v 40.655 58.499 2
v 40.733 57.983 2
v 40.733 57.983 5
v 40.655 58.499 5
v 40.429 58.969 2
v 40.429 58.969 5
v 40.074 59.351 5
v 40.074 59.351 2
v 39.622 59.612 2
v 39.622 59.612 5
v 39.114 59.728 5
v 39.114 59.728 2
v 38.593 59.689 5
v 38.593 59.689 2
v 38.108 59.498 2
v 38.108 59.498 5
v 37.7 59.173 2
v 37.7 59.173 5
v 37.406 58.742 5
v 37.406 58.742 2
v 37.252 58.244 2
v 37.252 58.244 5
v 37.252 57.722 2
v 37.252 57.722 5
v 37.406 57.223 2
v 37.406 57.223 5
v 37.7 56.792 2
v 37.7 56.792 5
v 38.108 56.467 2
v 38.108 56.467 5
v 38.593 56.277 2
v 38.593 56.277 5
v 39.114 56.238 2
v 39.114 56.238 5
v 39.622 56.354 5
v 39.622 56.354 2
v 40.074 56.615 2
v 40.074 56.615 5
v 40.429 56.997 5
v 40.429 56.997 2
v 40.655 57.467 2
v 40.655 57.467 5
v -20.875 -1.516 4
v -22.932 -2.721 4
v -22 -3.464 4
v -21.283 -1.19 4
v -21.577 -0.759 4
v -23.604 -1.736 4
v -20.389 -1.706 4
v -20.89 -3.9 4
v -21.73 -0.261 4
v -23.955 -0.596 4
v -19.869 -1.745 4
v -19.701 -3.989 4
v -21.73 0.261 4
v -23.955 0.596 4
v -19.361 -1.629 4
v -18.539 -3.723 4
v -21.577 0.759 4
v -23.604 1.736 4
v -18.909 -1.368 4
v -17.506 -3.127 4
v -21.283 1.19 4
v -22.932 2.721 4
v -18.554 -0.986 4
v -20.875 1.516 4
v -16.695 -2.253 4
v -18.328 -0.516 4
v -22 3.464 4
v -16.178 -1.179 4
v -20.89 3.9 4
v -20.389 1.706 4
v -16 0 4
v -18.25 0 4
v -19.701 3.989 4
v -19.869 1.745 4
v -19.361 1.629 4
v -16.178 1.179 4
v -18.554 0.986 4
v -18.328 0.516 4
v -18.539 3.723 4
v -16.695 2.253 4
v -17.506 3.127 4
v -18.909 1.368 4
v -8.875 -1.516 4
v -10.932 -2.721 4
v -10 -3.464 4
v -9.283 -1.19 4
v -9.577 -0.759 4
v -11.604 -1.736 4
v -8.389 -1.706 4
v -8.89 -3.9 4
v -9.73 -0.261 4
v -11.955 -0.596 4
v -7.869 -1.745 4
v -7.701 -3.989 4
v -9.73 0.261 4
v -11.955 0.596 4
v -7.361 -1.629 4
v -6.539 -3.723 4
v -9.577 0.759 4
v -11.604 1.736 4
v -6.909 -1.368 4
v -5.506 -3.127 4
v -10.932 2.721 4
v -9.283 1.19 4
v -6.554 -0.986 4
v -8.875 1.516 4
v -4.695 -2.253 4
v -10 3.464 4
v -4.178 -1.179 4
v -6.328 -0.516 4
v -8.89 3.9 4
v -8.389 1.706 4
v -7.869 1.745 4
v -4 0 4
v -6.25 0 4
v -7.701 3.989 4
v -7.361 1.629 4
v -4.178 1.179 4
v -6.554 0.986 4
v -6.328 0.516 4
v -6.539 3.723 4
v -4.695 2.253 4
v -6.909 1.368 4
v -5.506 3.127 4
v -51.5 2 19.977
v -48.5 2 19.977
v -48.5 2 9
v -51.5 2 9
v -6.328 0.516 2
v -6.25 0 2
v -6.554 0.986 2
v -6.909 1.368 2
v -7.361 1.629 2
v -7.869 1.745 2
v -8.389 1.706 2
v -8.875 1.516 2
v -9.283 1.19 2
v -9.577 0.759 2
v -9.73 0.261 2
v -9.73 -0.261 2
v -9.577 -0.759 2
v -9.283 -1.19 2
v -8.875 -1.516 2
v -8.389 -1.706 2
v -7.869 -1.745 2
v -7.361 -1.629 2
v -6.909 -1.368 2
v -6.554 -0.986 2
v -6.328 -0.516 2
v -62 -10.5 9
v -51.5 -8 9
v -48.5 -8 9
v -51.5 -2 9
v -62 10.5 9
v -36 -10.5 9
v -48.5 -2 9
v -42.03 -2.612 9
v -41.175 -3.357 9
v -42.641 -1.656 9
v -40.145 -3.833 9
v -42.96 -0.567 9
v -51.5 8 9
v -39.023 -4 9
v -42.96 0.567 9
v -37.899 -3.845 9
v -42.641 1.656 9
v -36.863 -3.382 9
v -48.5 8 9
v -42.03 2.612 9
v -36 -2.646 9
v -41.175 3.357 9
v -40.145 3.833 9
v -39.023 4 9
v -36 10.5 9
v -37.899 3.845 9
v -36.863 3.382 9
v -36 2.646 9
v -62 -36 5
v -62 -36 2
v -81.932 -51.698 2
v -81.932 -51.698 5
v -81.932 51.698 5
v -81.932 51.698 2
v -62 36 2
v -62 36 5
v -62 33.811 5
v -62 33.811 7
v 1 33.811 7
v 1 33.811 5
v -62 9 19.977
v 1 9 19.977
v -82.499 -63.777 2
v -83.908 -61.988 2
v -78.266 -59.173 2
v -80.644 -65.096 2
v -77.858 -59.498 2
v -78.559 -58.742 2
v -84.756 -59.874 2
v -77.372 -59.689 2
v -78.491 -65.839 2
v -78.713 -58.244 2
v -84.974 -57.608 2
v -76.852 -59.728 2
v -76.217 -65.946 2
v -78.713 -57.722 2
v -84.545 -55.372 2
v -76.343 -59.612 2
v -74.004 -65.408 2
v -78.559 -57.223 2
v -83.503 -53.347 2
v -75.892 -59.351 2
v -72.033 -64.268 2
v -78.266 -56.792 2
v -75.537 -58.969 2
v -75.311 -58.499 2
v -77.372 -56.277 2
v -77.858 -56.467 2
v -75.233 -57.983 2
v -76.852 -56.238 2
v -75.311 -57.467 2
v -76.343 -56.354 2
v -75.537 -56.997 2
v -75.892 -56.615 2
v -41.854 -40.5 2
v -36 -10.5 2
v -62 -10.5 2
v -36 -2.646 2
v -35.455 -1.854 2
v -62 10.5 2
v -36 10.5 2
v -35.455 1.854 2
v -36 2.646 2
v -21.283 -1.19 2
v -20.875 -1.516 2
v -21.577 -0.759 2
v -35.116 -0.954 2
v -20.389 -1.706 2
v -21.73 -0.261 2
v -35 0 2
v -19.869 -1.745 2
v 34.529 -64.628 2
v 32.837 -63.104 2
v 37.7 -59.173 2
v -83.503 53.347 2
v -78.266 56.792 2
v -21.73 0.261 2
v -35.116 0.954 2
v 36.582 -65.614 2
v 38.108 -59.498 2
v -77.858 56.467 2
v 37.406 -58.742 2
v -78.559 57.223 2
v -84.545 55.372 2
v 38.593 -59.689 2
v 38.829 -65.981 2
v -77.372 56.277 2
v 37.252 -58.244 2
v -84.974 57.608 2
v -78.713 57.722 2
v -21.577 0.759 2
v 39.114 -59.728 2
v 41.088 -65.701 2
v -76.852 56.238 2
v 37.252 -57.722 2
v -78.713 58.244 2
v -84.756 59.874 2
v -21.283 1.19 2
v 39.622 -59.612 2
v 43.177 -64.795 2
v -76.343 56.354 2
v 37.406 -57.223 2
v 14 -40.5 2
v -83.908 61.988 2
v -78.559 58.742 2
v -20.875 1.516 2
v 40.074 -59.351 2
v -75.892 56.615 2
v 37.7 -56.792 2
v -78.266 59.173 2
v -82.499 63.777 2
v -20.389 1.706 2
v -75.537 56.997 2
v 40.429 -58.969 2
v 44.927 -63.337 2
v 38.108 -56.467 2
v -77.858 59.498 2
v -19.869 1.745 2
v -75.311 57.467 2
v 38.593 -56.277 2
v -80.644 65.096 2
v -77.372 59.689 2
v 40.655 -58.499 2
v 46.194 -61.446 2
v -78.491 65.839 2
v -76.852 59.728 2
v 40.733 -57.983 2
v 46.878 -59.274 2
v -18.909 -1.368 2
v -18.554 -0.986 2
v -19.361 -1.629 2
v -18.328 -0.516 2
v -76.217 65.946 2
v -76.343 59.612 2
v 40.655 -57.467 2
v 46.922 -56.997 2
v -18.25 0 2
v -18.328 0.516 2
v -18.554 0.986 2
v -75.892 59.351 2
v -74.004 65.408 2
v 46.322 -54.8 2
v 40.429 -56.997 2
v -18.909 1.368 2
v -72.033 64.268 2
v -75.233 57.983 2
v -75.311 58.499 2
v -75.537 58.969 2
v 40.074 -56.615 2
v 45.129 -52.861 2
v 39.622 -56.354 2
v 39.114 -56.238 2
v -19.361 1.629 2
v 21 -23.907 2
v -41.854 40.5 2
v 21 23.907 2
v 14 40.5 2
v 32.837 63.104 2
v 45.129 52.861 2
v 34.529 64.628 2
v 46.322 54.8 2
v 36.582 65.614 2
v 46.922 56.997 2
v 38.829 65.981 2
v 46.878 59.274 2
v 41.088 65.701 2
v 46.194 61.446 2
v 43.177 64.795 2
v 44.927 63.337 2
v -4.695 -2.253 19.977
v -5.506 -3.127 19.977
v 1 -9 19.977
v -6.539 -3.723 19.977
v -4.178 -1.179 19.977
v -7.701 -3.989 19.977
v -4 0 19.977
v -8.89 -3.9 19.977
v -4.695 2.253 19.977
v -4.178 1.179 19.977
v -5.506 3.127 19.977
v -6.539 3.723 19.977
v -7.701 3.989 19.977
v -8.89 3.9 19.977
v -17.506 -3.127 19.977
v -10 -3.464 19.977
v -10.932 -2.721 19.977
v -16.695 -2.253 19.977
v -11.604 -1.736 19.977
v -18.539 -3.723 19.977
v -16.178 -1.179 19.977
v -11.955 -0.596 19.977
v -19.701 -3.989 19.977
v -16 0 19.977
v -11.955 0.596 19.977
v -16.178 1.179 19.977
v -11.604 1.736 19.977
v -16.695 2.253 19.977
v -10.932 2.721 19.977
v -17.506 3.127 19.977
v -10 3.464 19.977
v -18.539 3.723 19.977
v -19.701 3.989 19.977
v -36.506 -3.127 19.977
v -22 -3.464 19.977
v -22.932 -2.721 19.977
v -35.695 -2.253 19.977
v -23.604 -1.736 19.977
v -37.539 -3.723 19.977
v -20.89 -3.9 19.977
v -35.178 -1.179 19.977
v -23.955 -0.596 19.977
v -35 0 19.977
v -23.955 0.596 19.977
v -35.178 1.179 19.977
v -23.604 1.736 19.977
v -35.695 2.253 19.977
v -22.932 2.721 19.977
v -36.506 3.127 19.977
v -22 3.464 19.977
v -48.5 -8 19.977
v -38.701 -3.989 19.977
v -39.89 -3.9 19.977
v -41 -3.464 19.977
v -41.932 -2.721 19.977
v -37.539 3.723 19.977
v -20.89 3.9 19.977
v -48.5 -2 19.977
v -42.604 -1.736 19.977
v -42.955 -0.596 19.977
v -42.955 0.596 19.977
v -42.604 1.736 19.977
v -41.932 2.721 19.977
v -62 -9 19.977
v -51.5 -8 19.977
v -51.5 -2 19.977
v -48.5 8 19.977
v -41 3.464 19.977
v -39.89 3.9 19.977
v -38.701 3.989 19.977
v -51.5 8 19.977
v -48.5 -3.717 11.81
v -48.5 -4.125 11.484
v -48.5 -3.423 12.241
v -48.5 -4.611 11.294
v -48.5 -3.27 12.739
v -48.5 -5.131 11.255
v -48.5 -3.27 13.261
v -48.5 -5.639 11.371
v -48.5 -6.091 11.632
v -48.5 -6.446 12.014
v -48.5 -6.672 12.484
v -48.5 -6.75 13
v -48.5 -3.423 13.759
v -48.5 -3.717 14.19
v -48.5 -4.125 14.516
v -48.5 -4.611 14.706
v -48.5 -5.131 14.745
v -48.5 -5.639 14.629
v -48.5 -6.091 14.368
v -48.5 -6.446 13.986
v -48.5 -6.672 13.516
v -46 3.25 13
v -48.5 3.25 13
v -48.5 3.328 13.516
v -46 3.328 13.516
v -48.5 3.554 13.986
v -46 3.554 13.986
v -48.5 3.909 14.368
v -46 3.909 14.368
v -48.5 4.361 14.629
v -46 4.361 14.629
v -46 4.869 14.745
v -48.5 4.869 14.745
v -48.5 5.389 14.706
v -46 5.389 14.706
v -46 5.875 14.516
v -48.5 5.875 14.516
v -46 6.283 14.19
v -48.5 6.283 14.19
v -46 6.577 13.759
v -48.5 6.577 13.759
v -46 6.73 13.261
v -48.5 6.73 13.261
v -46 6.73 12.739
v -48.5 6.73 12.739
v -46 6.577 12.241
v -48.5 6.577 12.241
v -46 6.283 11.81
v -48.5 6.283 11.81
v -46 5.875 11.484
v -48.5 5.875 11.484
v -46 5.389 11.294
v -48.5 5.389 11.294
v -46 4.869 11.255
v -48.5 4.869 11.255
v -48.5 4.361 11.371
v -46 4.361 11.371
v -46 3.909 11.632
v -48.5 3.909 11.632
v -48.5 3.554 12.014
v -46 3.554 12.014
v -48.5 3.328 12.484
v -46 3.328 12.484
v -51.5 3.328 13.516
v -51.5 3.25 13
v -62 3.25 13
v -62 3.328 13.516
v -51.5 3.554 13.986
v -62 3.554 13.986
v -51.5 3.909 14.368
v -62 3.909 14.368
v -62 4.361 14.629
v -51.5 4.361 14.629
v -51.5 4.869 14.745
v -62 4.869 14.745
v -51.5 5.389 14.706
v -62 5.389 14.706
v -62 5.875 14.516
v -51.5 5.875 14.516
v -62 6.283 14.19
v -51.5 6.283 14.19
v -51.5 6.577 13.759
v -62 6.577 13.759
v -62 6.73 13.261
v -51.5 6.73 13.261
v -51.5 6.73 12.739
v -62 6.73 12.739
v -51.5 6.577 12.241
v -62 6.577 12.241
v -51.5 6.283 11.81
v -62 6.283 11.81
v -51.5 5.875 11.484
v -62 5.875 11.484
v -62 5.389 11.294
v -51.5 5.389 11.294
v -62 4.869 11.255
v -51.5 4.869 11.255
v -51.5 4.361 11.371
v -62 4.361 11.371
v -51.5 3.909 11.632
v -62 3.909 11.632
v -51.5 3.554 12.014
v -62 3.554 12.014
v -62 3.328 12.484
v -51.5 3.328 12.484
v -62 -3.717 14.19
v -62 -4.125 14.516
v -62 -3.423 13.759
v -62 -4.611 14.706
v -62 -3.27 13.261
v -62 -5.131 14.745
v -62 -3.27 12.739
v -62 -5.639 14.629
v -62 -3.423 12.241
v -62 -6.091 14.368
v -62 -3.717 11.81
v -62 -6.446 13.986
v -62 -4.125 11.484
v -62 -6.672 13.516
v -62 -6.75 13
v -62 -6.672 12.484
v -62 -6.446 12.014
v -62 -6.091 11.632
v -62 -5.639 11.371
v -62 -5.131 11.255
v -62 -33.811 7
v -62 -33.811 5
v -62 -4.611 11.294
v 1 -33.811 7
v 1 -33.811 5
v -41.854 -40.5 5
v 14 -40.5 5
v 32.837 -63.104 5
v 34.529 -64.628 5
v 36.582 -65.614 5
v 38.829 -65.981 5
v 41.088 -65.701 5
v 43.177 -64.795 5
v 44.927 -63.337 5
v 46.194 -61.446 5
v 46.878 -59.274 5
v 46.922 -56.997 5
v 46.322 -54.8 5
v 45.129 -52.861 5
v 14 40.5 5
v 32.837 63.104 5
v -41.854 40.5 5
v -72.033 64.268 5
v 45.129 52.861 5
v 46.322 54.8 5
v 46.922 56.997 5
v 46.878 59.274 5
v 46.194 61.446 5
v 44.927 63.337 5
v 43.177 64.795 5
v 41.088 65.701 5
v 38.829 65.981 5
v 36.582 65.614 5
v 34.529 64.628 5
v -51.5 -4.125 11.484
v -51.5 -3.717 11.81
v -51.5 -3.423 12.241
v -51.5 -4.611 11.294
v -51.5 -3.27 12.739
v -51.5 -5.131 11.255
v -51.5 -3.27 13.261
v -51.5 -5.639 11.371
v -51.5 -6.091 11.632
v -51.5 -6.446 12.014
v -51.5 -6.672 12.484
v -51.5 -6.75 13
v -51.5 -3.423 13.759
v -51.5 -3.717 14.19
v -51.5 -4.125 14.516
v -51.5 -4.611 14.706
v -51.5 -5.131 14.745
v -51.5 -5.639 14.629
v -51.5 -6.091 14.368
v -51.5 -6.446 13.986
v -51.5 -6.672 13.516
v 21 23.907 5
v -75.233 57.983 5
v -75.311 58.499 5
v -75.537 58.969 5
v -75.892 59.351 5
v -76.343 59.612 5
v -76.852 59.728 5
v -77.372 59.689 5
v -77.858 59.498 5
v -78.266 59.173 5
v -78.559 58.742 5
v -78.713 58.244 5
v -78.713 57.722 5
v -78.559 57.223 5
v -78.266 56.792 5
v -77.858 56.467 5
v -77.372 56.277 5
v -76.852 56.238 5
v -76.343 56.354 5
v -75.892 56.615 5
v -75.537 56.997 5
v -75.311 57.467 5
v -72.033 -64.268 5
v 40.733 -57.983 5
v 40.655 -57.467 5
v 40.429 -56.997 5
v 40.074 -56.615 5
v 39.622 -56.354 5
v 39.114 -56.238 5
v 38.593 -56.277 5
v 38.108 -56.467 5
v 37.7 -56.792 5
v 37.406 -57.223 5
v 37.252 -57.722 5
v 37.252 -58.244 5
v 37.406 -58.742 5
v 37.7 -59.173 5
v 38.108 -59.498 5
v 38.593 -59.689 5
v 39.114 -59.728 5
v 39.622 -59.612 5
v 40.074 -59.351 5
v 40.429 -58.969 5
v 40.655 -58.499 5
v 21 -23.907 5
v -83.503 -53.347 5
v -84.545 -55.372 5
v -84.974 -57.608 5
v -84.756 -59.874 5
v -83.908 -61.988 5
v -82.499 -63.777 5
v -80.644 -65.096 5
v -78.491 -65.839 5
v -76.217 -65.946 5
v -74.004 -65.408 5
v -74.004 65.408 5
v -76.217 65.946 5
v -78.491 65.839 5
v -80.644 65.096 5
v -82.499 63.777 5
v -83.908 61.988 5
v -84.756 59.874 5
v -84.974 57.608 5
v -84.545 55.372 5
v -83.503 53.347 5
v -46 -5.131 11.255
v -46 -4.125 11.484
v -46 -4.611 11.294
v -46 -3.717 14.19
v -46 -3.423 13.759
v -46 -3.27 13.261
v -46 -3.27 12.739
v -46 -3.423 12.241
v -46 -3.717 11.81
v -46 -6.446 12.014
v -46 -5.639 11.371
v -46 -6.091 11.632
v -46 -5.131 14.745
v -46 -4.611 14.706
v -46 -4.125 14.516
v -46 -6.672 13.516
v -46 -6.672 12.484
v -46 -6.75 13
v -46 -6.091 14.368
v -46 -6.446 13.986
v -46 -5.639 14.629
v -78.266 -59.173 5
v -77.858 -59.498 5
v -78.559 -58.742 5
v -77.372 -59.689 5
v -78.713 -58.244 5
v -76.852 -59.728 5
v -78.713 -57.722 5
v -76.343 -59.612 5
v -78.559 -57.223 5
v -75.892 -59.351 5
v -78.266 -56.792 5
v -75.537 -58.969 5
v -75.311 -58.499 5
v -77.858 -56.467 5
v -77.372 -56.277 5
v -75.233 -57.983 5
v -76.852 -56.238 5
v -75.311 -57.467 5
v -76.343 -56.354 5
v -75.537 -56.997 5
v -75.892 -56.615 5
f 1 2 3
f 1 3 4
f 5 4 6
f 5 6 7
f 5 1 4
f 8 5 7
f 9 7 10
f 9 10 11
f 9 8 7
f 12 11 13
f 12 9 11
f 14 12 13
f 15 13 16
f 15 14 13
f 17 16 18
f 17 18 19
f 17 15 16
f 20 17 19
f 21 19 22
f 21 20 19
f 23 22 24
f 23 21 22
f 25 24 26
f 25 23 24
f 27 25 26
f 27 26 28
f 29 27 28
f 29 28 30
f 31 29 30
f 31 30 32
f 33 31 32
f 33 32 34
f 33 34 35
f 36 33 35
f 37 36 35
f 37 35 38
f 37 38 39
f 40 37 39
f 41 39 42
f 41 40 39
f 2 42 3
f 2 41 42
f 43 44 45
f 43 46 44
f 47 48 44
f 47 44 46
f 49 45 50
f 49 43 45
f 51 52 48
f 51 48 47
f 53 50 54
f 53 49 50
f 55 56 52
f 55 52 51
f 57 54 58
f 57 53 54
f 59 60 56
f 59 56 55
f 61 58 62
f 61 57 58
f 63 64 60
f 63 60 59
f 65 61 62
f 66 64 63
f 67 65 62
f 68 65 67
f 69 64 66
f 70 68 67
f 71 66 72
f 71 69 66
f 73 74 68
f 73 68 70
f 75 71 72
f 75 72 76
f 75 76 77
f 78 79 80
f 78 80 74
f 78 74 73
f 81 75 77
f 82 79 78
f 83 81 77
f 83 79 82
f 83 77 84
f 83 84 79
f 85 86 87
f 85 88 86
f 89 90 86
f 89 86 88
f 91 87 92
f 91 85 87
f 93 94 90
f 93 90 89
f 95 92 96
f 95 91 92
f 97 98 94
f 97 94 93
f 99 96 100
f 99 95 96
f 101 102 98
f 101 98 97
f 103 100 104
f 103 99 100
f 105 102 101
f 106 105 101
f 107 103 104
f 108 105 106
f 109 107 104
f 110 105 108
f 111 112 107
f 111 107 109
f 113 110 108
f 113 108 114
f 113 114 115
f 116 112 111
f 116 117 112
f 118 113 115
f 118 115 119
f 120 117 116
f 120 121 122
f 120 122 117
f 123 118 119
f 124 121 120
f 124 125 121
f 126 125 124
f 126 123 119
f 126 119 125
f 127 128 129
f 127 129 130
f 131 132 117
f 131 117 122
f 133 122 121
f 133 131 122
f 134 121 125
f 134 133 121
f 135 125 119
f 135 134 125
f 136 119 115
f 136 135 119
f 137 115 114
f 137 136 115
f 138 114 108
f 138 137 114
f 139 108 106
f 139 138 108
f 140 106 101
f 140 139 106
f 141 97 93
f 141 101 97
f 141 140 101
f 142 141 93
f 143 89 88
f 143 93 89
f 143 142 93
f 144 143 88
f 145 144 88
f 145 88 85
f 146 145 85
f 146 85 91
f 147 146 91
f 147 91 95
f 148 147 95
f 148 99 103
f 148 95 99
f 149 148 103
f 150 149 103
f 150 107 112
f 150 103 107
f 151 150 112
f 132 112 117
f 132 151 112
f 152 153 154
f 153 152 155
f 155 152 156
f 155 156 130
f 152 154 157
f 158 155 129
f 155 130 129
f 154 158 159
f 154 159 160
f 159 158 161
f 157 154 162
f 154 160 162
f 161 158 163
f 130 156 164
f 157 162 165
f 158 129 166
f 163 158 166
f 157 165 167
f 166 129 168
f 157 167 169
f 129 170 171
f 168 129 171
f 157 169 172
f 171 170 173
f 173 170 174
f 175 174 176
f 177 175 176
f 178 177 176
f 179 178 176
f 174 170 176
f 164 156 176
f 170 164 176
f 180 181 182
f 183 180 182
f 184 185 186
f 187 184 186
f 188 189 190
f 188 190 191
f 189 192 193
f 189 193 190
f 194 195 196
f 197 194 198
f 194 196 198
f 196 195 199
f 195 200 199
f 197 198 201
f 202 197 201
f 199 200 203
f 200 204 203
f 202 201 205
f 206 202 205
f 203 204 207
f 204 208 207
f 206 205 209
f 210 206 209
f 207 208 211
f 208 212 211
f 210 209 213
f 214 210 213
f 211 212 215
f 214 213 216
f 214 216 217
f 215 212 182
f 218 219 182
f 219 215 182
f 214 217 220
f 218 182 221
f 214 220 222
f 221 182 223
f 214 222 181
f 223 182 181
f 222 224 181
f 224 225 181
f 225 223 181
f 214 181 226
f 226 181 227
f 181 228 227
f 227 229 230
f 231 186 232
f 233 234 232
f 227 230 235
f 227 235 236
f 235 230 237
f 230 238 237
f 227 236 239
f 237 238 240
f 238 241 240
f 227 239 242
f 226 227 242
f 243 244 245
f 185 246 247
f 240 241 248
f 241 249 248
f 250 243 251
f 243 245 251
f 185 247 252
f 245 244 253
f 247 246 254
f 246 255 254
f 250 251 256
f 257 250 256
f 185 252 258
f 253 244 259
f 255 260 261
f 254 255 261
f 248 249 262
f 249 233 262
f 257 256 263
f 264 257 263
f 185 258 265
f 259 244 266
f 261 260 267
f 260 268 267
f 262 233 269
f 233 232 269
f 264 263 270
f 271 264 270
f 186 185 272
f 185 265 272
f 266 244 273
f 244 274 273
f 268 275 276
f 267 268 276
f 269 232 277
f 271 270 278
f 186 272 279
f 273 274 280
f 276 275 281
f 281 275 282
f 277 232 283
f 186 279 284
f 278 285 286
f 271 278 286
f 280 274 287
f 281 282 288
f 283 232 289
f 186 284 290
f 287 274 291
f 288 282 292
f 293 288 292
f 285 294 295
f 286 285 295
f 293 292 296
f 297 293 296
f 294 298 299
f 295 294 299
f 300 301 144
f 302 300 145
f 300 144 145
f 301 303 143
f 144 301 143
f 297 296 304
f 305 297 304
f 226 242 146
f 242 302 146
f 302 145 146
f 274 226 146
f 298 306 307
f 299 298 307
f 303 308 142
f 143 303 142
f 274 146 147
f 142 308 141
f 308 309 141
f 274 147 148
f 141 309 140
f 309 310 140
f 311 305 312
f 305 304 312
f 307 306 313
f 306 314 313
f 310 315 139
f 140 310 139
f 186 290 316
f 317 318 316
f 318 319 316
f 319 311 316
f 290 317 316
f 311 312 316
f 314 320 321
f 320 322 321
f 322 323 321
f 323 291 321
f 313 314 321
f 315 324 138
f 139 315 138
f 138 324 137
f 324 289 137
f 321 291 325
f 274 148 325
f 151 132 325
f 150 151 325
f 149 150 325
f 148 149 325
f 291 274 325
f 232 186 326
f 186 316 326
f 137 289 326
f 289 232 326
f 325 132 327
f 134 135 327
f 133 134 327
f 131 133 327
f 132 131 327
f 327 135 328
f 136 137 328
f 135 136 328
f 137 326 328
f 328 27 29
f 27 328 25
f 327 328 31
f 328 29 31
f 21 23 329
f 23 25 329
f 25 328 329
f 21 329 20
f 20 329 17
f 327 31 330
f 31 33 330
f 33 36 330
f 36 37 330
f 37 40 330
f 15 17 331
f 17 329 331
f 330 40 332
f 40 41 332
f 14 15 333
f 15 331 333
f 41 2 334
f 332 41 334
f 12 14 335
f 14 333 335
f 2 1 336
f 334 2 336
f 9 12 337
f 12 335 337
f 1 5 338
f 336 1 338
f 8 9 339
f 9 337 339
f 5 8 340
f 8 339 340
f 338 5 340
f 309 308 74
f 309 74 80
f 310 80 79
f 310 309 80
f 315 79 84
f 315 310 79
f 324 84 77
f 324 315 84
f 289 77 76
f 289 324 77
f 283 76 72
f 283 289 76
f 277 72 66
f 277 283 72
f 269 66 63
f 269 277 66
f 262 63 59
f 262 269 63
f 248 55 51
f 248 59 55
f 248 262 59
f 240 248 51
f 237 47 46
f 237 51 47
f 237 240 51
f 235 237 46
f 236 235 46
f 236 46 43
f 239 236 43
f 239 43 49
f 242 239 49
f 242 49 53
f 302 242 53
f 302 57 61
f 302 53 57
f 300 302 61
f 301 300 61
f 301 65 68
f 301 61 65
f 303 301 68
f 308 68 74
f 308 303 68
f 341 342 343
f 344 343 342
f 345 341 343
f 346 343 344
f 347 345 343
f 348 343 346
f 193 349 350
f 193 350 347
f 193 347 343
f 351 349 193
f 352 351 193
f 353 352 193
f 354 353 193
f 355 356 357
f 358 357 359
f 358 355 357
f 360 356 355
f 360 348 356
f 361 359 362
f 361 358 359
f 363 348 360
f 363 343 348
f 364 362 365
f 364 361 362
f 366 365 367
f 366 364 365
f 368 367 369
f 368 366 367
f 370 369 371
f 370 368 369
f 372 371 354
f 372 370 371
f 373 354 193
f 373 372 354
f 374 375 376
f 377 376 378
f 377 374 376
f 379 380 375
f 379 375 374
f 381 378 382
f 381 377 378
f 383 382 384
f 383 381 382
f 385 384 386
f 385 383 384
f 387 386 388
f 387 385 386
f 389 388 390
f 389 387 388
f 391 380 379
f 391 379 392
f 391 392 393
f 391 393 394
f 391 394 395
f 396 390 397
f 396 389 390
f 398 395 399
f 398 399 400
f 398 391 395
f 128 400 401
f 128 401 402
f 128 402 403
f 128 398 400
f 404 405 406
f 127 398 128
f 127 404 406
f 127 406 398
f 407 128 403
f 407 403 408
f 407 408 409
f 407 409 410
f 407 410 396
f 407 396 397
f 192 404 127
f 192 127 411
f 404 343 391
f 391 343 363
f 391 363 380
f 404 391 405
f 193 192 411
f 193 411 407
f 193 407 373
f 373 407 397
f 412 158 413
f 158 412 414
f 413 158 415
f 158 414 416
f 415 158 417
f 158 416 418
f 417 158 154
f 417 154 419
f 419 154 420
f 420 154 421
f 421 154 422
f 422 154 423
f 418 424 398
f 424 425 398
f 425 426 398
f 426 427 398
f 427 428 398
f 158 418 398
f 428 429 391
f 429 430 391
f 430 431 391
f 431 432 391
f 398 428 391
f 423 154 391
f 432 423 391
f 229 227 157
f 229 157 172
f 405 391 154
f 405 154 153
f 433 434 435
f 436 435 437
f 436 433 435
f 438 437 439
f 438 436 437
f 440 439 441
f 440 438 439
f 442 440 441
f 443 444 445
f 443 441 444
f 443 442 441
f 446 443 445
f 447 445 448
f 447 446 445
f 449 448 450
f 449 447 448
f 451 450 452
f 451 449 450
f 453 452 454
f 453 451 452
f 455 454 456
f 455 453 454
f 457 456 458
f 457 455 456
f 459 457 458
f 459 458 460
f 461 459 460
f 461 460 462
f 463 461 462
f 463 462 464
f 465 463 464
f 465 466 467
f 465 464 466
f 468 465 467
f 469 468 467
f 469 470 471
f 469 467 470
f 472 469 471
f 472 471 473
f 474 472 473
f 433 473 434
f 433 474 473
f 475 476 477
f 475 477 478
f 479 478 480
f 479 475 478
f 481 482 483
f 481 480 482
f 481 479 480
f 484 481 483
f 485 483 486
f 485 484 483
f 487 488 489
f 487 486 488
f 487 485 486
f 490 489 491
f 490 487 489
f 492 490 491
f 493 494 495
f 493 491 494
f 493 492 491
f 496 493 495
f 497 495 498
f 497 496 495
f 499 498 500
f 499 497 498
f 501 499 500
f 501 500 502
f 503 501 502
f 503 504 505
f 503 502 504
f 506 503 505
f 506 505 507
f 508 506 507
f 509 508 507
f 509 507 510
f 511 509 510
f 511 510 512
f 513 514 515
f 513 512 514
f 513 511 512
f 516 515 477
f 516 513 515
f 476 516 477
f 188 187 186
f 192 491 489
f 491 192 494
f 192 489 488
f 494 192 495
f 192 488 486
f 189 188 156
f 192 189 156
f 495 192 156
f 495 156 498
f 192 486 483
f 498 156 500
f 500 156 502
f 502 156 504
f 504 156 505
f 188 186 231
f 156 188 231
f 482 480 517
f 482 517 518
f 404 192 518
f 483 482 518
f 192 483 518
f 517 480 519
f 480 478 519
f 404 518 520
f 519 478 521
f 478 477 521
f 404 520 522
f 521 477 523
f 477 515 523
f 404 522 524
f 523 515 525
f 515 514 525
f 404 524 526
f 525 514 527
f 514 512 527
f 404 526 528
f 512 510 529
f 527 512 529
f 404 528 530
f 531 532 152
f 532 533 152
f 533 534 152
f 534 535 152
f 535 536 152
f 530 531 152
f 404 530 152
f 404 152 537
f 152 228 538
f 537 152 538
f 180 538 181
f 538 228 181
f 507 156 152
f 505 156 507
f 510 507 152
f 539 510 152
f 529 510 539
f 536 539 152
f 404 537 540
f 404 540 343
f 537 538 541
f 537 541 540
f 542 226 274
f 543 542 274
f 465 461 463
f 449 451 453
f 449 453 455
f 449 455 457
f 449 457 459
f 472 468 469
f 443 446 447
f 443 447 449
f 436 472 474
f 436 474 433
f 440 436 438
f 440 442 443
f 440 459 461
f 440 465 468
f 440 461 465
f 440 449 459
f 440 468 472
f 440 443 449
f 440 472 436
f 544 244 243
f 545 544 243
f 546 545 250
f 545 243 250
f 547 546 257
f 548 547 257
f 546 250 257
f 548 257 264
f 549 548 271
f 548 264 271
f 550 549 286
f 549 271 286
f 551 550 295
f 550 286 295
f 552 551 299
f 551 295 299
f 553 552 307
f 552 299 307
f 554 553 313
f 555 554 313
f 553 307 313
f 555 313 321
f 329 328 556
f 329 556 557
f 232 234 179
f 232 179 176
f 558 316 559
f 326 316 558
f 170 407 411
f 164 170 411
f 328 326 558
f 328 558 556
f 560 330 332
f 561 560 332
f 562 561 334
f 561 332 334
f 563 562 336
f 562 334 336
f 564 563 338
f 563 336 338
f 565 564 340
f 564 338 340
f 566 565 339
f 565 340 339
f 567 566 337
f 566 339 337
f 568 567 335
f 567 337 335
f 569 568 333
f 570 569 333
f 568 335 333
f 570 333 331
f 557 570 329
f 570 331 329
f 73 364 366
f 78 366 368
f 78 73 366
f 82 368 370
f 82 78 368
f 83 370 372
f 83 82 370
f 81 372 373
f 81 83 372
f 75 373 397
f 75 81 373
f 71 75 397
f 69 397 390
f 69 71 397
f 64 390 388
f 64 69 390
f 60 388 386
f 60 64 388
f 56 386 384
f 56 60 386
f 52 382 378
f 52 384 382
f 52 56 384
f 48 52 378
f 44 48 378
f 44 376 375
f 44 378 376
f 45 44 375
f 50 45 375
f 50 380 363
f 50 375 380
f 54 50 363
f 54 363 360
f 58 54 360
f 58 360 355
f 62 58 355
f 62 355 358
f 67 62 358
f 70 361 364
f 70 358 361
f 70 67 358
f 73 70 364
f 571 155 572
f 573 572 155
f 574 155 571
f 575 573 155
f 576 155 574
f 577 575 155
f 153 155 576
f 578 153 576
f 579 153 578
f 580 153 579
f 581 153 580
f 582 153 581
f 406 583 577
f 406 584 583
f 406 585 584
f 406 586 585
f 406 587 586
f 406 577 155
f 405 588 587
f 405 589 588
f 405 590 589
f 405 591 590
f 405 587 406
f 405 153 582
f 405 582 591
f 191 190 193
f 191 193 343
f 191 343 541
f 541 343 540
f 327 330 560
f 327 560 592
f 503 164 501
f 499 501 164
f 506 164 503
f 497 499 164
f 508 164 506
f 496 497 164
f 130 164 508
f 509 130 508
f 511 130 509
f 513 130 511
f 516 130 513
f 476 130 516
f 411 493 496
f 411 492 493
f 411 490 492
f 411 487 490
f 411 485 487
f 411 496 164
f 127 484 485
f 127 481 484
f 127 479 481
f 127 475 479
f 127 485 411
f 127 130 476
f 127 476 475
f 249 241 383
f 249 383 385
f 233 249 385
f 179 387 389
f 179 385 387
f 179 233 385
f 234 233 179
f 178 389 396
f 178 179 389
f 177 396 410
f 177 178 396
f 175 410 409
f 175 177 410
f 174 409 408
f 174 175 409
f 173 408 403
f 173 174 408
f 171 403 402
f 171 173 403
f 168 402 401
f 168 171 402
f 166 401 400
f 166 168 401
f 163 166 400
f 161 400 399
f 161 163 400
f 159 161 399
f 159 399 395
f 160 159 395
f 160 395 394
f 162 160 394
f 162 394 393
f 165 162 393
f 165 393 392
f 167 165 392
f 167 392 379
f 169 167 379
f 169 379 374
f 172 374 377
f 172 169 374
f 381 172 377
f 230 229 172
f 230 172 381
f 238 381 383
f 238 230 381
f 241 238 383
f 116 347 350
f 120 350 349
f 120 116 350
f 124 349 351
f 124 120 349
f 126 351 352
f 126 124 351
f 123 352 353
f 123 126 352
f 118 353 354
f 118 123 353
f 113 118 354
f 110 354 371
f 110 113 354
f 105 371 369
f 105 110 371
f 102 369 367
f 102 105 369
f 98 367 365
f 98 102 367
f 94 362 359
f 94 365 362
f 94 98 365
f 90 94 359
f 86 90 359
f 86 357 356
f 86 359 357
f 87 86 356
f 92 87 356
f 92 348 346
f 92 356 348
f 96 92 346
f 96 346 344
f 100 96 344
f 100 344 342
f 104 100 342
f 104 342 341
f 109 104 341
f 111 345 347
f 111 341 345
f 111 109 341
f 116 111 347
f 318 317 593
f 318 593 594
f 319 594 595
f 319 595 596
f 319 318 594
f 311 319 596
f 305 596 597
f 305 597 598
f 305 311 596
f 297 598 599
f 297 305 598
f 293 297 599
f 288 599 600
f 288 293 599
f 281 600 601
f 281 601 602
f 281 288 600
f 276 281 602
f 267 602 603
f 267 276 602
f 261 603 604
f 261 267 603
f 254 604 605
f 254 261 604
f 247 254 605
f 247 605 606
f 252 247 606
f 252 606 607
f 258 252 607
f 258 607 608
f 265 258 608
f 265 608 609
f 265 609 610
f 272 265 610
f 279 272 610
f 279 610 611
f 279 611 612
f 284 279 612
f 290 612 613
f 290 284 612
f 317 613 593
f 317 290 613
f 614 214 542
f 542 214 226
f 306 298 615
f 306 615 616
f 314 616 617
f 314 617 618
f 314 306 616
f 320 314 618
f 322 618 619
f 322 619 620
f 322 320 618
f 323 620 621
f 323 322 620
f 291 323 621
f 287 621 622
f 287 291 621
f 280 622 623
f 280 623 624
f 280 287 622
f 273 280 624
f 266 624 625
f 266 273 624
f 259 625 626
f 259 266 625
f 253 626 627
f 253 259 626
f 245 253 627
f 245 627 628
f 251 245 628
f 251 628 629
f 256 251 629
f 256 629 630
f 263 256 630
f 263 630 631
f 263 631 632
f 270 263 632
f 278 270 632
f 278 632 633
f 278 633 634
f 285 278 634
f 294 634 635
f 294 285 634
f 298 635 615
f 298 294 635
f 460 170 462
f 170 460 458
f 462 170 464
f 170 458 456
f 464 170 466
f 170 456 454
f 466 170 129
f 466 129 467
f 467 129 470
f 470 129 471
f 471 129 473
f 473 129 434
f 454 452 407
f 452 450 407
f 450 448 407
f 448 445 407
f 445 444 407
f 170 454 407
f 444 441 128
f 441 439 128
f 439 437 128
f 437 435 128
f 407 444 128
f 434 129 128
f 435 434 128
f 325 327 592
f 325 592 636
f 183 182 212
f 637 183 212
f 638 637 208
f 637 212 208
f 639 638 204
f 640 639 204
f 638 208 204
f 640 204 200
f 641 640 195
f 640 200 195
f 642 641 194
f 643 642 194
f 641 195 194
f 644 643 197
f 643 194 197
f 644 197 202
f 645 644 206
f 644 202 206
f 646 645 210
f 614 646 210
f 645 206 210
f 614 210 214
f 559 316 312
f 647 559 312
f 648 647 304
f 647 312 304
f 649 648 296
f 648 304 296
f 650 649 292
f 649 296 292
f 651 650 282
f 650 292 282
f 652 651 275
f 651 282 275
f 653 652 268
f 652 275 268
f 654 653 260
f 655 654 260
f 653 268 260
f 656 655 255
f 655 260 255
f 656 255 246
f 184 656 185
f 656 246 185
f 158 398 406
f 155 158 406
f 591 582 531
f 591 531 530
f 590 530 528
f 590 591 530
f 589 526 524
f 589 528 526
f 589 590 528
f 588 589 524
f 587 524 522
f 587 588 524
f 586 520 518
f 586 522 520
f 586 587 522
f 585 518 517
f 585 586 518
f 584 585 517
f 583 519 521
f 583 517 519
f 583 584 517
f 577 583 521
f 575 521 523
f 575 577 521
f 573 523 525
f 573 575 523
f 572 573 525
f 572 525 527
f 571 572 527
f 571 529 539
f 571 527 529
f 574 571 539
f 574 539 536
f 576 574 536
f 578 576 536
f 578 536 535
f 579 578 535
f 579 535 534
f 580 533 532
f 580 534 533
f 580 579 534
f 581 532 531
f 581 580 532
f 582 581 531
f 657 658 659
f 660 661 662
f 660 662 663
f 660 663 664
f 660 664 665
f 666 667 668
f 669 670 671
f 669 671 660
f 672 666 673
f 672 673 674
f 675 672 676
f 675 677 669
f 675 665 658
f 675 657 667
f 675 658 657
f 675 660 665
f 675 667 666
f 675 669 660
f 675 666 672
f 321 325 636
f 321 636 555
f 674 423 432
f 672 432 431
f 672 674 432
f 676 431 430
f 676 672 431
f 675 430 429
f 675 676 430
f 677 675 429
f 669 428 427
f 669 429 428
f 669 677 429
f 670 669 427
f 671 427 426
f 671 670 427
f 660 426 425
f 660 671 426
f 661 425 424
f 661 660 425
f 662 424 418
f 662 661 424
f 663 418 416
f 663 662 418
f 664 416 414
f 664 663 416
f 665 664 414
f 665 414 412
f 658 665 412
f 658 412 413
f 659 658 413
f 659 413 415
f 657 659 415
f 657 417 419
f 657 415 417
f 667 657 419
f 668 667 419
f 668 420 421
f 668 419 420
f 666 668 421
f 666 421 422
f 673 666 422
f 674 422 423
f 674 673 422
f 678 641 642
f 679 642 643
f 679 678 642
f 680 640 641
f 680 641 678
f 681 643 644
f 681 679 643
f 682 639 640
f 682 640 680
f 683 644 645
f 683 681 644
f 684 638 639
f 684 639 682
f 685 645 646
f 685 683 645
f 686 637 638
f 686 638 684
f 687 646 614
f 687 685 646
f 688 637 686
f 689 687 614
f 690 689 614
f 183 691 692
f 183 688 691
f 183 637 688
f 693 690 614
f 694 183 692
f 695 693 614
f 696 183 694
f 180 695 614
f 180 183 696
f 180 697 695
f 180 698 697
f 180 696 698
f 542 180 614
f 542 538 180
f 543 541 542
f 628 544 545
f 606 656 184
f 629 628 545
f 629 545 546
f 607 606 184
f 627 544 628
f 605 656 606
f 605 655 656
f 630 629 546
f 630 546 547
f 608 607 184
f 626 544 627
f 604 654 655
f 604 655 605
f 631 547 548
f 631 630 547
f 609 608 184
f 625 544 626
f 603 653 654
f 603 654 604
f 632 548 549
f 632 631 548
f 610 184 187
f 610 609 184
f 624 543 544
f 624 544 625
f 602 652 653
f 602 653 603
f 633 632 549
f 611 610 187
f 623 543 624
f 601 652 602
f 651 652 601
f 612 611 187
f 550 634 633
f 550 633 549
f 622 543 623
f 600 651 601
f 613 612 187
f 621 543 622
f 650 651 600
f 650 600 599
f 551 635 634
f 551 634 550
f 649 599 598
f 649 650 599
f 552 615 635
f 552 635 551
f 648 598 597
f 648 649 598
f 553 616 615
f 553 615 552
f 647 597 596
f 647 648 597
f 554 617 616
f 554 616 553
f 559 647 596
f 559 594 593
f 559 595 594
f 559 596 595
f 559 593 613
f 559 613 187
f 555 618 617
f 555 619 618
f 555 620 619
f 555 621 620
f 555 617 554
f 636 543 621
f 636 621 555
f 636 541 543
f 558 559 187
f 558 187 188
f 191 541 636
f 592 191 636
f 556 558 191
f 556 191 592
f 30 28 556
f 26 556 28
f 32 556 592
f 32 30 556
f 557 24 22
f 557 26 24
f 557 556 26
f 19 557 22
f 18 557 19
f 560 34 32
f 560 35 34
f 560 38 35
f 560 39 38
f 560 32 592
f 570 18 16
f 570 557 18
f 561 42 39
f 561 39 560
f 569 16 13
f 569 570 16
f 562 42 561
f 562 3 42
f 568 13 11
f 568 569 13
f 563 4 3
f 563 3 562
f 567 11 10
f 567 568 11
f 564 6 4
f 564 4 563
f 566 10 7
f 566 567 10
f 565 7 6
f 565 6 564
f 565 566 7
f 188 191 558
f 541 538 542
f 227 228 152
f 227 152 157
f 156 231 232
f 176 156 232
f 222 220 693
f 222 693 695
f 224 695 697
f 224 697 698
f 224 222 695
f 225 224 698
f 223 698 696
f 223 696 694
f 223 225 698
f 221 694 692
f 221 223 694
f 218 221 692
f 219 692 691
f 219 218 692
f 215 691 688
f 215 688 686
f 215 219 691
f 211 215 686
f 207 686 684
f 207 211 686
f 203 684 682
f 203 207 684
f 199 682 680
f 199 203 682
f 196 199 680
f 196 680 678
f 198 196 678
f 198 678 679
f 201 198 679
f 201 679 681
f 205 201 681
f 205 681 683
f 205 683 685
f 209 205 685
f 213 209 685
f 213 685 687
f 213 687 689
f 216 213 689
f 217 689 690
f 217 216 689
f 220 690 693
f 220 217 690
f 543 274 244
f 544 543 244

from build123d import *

# Parameters (mm, degrees)
BOX063_W                  = 57
BOX063_H                  = 21
BOX063_DEPTH              = 15
CYLINDER030_R             = 1.75
CYLINDER030_DEPTH         = 24.5
CYLINDER030_PITCH_ANGLE   = 90
CYLINDER031_R             = 3
CYLINDER031_DEPTH         = 21.5
CYLINDER031_PITCH_ANGLE   = 90
FUSION027_PITCH_ANGLE     = -90
FUSION027_PLACEMENT_ANGLE = -180
FUSION024_PITCH_ANGLE     = -90
FUSION024_PLACEMENT_ANGLE = -180
FUSION025_PITCH_ANGLE     = -90
FUSION025_PLACEMENT_ANGLE = -180
BOX029_W                  = 3
BOX029_H                  = 74
BOX029_DEPTH              = 6
BOX029_PITCH_ANGLE        = -90
BOX029_PLACEMENT_ANGLE    = -180
BOX030_W                  = 3
BOX030_H                  = 74
BOX030_DEPTH              = 6
BOX030_PITCH_ANGLE        = -90
BOX030_PLACEMENT_ANGLE    = -180
FUSION026_PITCH_ANGLE     = -90
FUSION026_PLACEMENT_ANGLE = -180
FUSION056_ROLL_ANGLE      = -90
FUSION056_PLACEMENT_ANGLE = 90
CYLINDER_R                = 4
CYLINDER_DEPTH            = 60
CYLINDER063_R             = 1.75
CYLINDER063_DEPTH         = 60
CYLINDER061_R             = 4
CYLINDER061_DEPTH         = 60
CYLINDER060_R             = 4
CYLINDER060_DEPTH         = 60
CYLINDER062_R             = 1.75
CYLINDER062_DEPTH         = 60
SKETCH009_R               = 1.75
PAD007_DEPTH              = 3
PAD008_DEPTH              = 63


with BuildPart() as cube066:
    # Box063 → Box063 (new body)
    with BuildSketch(Plane(origin=(-93, -10.5, -6), x_dir=(1, 0, 0), z_dir=(0, 0, 1))):
        with Locations((28.5, 10.5)):
            Rectangle(BOX063_W, BOX063_H)
    extrude(amount=BOX063_DEPTH)


with BuildPart() as joint_d014:
    # Cylinder030 → Cylinder030 (new body)
    with BuildSketch(Plane.XY):
        Circle(CYLINDER030_R)
    extrude(amount=CYLINDER030_DEPTH)


with BuildPart() as joint_d014_1:
    # Cylinder030 pitch: moved
    add(joint_d014.part.rotate(Axis((0, 0, 0), (0, 1, 0)), CYLINDER030_PITCH_ANGLE))


with BuildPart() as joint_d014_2:
    # Cylinder030 placement: moved
    add(joint_d014_1.part.moved(Location((16, -24.5, 7))))


with BuildPart() as joint_d015:
    # Cylinder031 → Cylinder031 (new body)
    with BuildSketch(Plane.XY):
        Circle(CYLINDER031_R)
    extrude(amount=CYLINDER031_DEPTH)


with BuildPart() as joint_d015_1:
    # Cylinder031 pitch: moved
    add(joint_d015.part.rotate(Axis((0, 0, 0), (0, 1, 0)), CYLINDER031_PITCH_ANGLE))


with BuildPart() as joint_d015_2:
    # Cylinder031 placement: moved
    add(joint_d015_1.part.moved(Location((37, -24.5, 7))))


with BuildPart() as fusion027:
    # Fusion027 base: copy of Joint-D015
    add(joint_d015_2.part)

    # Fusion027: union Joint-D014
    add(joint_d014_2.part)


with BuildPart() as fusion027_1:
    # Fusion027 pitch: moved
    add(fusion027.part.rotate(Axis((0, 0, 0), (0, 1, 0)), FUSION027_PITCH_ANGLE))


with BuildPart() as fusion027_2:
    # Fusion027 placement: moved
    add(fusion027_1.part.moved(Location((-2, -39.5, 0))).rotate(Axis((-2, -39.5, 0), (0, 0, 1)), FUSION027_PLACEMENT_ANGLE))


with BuildPart() as fusion024:
    # Fusion024 base: copy of Joint-D015
    add(joint_d015_2.part)

    # Fusion024: union Joint-D014
    add(joint_d014_2.part)


with BuildPart() as fusion024_1:
    # Fusion024 pitch: moved
    add(fusion024.part.rotate(Axis((0, 0, 0), (0, 1, 0)), FUSION024_PITCH_ANGLE))


with BuildPart() as fusion024_2:
    # Fusion024 placement: moved
    add(fusion024_1.part.moved(Location((-12, 9.5, 0))).rotate(Axis((-12, 9.5, 0), (0, 0, 1)), FUSION024_PLACEMENT_ANGLE))


with BuildPart() as fusion025:
    # Fusion025 base: copy of Joint-D015
    add(joint_d015_2.part)

    # Fusion025: union Joint-D014
    add(joint_d014_2.part)


with BuildPart() as fusion025_1:
    # Fusion025 pitch: moved
    add(fusion025.part.rotate(Axis((0, 0, 0), (0, 1, 0)), FUSION025_PITCH_ANGLE))


with BuildPart() as fusion025_2:
    # Fusion025 placement: moved
    add(fusion025_1.part.moved(Location((-2, 9.5, 0))).rotate(Axis((-2, 9.5, 0), (0, 0, 1)), FUSION025_PLACEMENT_ANGLE))


with BuildPart() as cube047:
    # Box029 → Box029 (new body)
    with BuildSketch(Plane.XY):
        with Locations((1.5, 37)):
            Rectangle(BOX029_W, BOX029_H)
    extrude(amount=BOX029_DEPTH)


with BuildPart() as cube047_1:
    # Box029 pitch: moved
    add(cube047.part.rotate(Axis((0, 0, 0), (0, 1, 0)), BOX029_PITCH_ANGLE))


with BuildPart() as cube047_2:
    # Box029 placement: moved
    add(cube047_1.part.moved(Location((-8, 41.5, 18.5))).rotate(Axis((-8, 41.5, 18.5), (0, 0, 1)), BOX029_PLACEMENT_ANGLE))


with BuildPart() as cube048:
    # Box030 → Box030 (new body)
    with BuildSketch(Plane.XY):
        with Locations((1.5, 37)):
            Rectangle(BOX030_W, BOX030_H)
    extrude(amount=BOX030_DEPTH)


with BuildPart() as cube048_1:
    # Box030 pitch: moved
    add(cube048.part.rotate(Axis((0, 0, 0), (0, 1, 0)), BOX030_PITCH_ANGLE))


with BuildPart() as cube048_2:
    # Box030 placement: moved
    add(cube048_1.part.moved(Location((2, 41.5, 18.5))).rotate(Axis((2, 41.5, 18.5), (0, 0, 1)), BOX030_PLACEMENT_ANGLE))


with BuildPart() as fusion056:
    # Fusion026 base: copy of Joint-D015
    add(joint_d015_2.part)

    # Fusion026: union Joint-D014
    add(joint_d014_2.part)


with BuildPart() as fusion056_1:
    # Fusion026 pitch: moved
    add(fusion056.part.rotate(Axis((0, 0, 0), (0, 1, 0)), FUSION026_PITCH_ANGLE))


with BuildPart() as fusion056_2:
    # Fusion026 placement: moved
    add(fusion056_1.part.moved(Location((-12, -39.5, 0))).rotate(Axis((-12, -39.5, 0), (0, 0, 1)), FUSION026_PLACEMENT_ANGLE))

    # Fusion056: union Fusion027, Fusion024, Fusion025, Cube047, Cube048
    add(fusion027_2.part)
    add(fusion024_2.part)
    add(fusion025_2.part)
    add(cube047_2.part)
    add(cube048_2.part)


with BuildPart() as fusion056_3:
    # Fusion056 roll: moved
    add(fusion056_2.part.rotate(Axis((0, 0, 0), (1, 0, 0)), FUSION056_ROLL_ANGLE))


with BuildPart() as fusion056_4:
    # Fusion056 placement: moved
    add(fusion056_3.part.moved(Location((-30, 0, -2))).rotate(Axis((-30, 0, -2), (0, 0, 1)), FUSION056_PLACEMENT_ANGLE))


with BuildPart() as cylinder:
    # Cylinder → Cylinder (new body)
    with BuildSketch(Plane(origin=(-39, 0, -20), x_dir=(1, 0, 0), z_dir=(0, 0, 1))):
        Circle(CYLINDER_R)
    extrude(amount=CYLINDER_DEPTH)


with BuildPart() as cylinder157:
    # Cylinder063 → Cylinder063 (new body)
    with BuildSketch(Plane(origin=(-8, 0, -12), x_dir=(1, 0, 0), z_dir=(0, 0, 1))):
        Circle(CYLINDER063_R)
    extrude(amount=CYLINDER063_DEPTH)


with BuildPart() as cylinder155:
    # Cylinder061 → Cylinder061 (new body)
    with BuildSketch(Plane(origin=(-8, 0, 4), x_dir=(1, 0, 0), z_dir=(0, 0, 1))):
        Circle(CYLINDER061_R)
    extrude(amount=CYLINDER061_DEPTH)


with BuildPart() as cylinder060:
    # Cylinder060 → Cylinder060 (new body)
    with BuildSketch(Plane(origin=(-20, 0, 4), x_dir=(1, 0, 0), z_dir=(0, 0, 1))):
        Circle(CYLINDER060_R)
    extrude(amount=CYLINDER060_DEPTH)


with BuildPart() as fusion073:
    # Cylinder062 → Cylinder062 (new body)
    with BuildSketch(Plane(origin=(-20, 0, -12), x_dir=(1, 0, 0), z_dir=(0, 0, 1))):
        Circle(CYLINDER062_R)
    extrude(amount=CYLINDER062_DEPTH)

    # Fusion073: union Cylinder157, Cylinder155, Cylinder060
    add(cylinder157.part)
    add(cylinder155.part)
    add(cylinder060.part)


with BuildPart() as pad007:
    # Sketch009 → Pad007 (new body)
    with BuildSketch(Plane.XY.offset(2)):
        with BuildLine():
            Line((-81.932444, 51.697807), (-62, 36))
            Line((-62, 36), (-62, -36))
            Line((-62, -36), (-81.932444, -51.697807))
            ThreePointArc((-81.932444, -51.697807), (-83.267699, -62.932452), (-72.033053, -64.267694))
            Line((-72.033053, -64.267694), (-41.853791, -40.5))
            Line((-41.853791, -40.5), (14, -40.5))
            Line((14, -40.5), (32.837002, -63.104251))
            ThreePointArc((32.837002, -63.104251), (44.104251, -64.12851), (45.12851, -52.861261))
            Line((21, -23.907244), (45.12851, -52.861261))
            Line((21, 23.907244), (21, -23.907244))
            Line((45.12851, 52.861262), (21, 23.907244))
            ThreePointArc((45.12851, 52.861262), (44.104251, 64.12851), (32.837002, 63.104251))
            Line((14, 40.5), (32.837002, 63.104251))
            Line((-41.853791, 40.5), (14, 40.5))
            Line((-72.033053, 64.267694), (-41.853791, 40.5))
            ThreePointArc((-72.033053, 64.267694), (-83.267699, 62.932452), (-81.932444, 51.697807))
        make_face()
        with Locations((-76.982756, 57.982756)):
            Circle(SKETCH009_R, mode=Mode.SUBTRACT)
        with Locations((-76.982756, -57.982756)):
            Circle(SKETCH009_R, mode=Mode.SUBTRACT)
        with Locations((38.982756, 57.982756)):
            Circle(SKETCH009_R, mode=Mode.SUBTRACT)
        with Locations((38.982756, -57.982756)):
            Circle(SKETCH009_R, mode=Mode.SUBTRACT)
    extrude(amount=PAD007_DEPTH)


with BuildPart() as clone_of_cut104:
    # Sketch010 → Pad008 (new body)
    with BuildSketch(Plane(origin=(-62, 2, 0), x_dir=(0, 1, 0), z_dir=(1, 0, 0))):
        Polygon((-35.811086, 2), (-35.811086, 7), (-11, 19.977288), (7, 19.977288), (31.811086, 7), (31.811086, 2), align=None)
    extrude(amount=PAD008_DEPTH)

    # Fusion074: union Pad007
    add(pad007.part)

    # Cut101: cut Fusion073
    add(fusion073.part, mode=Mode.SUBTRACT)

    # Cut102: cut Cylinder
    add(cylinder.part, mode=Mode.SUBTRACT)

    # Cut103: cut Fusion056
    add(fusion056_4.part, mode=Mode.SUBTRACT)

    # Cut104: cut Cube066
    add(cube066.part, mode=Mode.SUBTRACT)


solid = clone_of_cut104.part
